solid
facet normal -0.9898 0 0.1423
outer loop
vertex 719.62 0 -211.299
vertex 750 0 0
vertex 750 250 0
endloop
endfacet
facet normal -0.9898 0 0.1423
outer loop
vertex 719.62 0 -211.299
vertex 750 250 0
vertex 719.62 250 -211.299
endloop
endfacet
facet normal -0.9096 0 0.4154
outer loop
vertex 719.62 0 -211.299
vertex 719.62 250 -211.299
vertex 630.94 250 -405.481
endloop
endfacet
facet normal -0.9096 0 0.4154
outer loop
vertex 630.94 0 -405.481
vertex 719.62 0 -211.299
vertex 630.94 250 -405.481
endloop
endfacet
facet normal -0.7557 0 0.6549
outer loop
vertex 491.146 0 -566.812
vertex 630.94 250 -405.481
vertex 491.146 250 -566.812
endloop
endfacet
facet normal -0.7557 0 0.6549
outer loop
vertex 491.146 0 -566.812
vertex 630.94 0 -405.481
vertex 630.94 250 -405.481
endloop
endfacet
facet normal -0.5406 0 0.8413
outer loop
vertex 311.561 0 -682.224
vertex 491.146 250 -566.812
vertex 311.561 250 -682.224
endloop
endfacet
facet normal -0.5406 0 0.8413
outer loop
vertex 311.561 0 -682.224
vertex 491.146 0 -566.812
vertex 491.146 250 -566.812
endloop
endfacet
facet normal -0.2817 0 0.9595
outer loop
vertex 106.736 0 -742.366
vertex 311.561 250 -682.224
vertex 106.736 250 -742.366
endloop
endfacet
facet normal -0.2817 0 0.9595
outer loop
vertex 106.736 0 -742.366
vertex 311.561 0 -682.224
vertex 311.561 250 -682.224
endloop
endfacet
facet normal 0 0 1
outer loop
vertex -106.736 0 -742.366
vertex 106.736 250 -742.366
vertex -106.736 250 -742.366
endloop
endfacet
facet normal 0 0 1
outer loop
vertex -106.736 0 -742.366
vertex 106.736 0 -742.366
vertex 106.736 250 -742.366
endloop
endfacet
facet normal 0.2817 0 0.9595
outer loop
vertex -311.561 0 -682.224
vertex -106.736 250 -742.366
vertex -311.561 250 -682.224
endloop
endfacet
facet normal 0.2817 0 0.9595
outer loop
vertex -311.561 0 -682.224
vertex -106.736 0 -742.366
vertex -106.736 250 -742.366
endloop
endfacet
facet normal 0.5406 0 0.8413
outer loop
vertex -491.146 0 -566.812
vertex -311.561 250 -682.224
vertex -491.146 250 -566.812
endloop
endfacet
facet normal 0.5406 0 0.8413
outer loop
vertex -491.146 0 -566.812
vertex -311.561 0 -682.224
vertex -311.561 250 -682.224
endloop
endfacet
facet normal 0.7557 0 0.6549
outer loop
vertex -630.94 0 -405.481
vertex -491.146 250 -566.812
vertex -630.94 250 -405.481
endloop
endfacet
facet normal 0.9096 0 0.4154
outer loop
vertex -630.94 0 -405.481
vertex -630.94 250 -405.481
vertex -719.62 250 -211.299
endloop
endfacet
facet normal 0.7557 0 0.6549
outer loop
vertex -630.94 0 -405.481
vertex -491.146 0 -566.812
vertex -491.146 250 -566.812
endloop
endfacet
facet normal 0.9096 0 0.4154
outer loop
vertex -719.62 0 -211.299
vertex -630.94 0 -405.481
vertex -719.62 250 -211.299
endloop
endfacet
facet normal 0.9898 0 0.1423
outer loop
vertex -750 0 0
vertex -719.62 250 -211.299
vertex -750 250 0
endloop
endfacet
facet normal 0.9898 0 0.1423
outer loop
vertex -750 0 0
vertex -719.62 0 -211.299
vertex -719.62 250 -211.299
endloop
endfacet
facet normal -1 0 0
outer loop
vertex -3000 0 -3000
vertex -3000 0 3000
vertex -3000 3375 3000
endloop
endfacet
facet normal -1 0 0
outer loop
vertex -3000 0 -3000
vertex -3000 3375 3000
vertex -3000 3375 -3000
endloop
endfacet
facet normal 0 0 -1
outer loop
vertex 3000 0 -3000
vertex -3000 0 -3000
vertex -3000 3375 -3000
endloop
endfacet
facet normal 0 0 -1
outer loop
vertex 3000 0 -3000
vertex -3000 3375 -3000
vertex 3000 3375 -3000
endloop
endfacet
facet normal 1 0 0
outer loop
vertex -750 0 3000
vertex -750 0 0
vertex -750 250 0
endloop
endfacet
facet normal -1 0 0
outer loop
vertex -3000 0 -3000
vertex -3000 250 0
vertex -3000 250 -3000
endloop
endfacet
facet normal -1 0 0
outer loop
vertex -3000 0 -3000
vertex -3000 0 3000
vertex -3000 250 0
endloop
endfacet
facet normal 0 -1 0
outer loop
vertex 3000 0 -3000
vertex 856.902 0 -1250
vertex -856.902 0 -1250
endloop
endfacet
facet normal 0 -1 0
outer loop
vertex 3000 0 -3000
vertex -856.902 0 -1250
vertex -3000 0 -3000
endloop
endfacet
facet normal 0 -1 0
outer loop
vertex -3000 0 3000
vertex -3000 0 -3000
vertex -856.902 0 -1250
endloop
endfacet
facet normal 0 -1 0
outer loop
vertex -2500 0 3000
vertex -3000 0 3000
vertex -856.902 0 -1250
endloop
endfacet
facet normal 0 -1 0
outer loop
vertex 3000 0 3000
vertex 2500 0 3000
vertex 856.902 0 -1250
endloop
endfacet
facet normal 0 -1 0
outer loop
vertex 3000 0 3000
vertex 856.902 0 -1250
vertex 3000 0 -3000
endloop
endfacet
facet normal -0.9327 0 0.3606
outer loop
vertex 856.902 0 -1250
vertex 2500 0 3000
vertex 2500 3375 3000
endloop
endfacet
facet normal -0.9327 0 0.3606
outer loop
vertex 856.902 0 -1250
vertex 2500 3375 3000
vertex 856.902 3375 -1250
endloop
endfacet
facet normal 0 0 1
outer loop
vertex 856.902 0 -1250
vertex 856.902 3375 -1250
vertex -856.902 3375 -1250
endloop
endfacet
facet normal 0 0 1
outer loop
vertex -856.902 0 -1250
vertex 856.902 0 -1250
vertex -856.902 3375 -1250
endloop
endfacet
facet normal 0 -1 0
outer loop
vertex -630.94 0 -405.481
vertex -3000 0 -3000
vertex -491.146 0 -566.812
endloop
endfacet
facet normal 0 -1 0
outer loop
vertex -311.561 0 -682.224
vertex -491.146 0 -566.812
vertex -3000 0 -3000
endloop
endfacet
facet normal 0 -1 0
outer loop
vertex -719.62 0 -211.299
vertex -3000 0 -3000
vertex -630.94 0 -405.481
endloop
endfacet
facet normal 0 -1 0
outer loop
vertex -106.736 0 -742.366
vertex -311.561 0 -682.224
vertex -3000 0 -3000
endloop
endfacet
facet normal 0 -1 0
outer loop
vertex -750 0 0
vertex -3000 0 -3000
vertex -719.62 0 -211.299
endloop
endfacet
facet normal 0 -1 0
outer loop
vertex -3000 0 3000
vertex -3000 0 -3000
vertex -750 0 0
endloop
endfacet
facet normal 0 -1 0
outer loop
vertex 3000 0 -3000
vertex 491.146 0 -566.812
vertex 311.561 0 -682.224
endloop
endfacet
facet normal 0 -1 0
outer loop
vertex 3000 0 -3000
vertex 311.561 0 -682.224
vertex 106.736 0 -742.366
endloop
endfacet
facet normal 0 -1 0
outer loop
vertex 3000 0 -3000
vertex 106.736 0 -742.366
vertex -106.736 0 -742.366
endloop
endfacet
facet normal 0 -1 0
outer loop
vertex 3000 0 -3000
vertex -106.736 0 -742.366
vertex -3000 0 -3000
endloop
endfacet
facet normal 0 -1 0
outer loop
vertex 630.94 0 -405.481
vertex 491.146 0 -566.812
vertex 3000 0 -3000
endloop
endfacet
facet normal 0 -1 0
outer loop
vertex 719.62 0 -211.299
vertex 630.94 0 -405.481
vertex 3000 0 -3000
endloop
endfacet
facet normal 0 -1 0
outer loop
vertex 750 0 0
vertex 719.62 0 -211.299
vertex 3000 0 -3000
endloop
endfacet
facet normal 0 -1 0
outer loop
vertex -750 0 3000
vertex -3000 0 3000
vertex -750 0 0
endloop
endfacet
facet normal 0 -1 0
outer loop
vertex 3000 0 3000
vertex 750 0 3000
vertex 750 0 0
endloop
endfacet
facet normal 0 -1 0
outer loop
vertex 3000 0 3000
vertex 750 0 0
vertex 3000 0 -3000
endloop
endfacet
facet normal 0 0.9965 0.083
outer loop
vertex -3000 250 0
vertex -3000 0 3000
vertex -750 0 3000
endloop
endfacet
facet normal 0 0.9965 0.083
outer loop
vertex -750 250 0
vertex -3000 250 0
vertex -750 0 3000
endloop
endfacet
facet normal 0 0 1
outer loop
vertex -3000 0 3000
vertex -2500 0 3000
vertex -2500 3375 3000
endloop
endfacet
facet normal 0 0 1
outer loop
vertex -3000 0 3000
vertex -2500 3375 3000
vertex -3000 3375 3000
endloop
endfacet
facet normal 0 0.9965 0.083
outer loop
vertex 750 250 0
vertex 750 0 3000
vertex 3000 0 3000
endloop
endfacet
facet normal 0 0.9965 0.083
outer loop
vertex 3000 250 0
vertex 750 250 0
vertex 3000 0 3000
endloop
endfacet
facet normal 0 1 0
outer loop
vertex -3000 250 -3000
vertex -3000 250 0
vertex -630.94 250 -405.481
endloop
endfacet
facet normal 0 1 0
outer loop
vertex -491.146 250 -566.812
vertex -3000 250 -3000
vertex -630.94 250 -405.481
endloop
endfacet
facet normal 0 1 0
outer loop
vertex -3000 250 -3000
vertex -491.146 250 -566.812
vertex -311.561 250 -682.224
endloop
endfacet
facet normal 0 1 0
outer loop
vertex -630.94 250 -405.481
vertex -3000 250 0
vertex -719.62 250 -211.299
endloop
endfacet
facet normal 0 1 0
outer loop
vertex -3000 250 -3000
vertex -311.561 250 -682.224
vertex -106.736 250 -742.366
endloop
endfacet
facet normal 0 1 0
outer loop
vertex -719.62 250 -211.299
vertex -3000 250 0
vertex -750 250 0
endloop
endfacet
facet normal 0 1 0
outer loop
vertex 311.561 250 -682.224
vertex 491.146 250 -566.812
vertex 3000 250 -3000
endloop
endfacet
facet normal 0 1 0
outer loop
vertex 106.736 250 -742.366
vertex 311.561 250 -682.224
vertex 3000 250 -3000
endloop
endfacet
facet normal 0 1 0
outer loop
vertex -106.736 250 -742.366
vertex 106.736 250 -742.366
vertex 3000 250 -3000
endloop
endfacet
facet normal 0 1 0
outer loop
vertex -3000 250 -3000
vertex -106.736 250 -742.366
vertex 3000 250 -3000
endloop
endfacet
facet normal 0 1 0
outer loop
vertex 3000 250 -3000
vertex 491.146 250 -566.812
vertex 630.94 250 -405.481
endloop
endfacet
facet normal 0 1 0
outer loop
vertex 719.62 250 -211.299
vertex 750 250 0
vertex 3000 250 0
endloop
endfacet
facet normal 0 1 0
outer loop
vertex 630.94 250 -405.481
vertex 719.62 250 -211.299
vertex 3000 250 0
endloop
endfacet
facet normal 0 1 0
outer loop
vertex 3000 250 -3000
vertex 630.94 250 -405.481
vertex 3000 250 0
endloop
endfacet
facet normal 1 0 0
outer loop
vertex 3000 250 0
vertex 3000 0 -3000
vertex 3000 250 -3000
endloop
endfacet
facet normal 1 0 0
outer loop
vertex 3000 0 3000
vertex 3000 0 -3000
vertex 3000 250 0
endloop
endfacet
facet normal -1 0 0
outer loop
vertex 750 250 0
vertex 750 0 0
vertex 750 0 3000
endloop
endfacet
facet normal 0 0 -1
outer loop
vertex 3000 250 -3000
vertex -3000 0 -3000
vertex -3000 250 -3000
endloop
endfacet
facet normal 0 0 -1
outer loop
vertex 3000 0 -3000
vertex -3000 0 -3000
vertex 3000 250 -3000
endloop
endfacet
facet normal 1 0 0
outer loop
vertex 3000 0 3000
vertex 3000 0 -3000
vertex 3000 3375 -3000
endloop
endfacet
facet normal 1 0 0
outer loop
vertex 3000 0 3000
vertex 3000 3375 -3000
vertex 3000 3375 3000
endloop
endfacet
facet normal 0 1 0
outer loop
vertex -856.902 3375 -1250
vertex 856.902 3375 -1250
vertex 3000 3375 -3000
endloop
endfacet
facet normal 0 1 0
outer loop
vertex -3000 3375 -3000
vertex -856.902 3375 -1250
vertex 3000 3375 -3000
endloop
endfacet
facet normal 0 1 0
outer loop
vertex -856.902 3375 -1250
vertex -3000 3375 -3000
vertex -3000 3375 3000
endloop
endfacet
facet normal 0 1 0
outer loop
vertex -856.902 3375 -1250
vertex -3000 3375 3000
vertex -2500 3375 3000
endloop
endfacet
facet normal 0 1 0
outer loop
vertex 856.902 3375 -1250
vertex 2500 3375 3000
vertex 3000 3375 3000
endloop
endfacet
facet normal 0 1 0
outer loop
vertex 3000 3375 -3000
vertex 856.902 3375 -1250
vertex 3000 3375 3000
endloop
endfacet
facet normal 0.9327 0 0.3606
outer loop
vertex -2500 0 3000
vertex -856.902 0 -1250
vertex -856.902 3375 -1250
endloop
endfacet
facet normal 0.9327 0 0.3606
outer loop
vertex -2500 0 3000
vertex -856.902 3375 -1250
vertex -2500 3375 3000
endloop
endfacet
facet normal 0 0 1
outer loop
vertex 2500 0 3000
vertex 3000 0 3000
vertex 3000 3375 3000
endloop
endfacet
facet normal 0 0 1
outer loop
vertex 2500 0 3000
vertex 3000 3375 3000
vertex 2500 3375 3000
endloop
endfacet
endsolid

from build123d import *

# Parameters (mm, degrees)
F1_DEPTH = 3375
F2_W     = 2250
F2_H     = 3000
F3_DEPTH = 250
F4_SIZE2 = 249.99999
F4_SIZE  = 2999.99999
F5_SIZE2 = 249.99999
F5_SIZE  = 2999.99999
F6_DEPTH = 250


# Not quite as in the source:
# - a fillet or chamfer is up to 0.001 mm smaller than in the source, because OpenCascade refuses the exact size


with BuildPart() as f1:
    # F0 (on Front) → F1 (new body)
    with BuildSketch(Plane.XZ):
        Polygon((3000, -3000), (3000, 3000), (2500, 3000), (856.9015333837, -1250), (-856.9015333837, -1250), (-2500, 3000), (-3000, 3000), (-3000, -3000), align=None)
    extrude(amount=-F1_DEPTH)


with BuildPart() as f3:
    # F2 (on Front) → F3 (new body)
    with BuildSketch(Plane.XZ):
        with Locations((1875, 1500)):
            Rectangle(F2_W, F2_H)
    extrude(amount=-F3_DEPTH)

    # F4 (size 3000 and 250 in the source; OpenCascade refuses exactly that, so slightly less here)
    f4_edges = [f3.edges().sort_by_distance(p)[0] for p in [
        (1875, 250, 3000),
    ]]
    f4_side = f3.faces().sort_by_distance((1875, 250, 1500))[0]
    chamfer(f4_edges, length=F4_SIZE, length2=F4_SIZE2, reference=f4_side)



with BuildPart() as f3b:
    # F2 (on Front) → F3, piece 2 (new body)
    with BuildSketch(Plane.XZ):
        with Locations((-1875, 1500)):
            Rectangle(F2_W, F2_H)
    extrude(amount=-F3_DEPTH)

    # F5 (size 3000 and 250 in the source; OpenCascade refuses exactly that, so slightly less here)
    f5_edges = [f3b.edges().sort_by_distance(p)[0] for p in [
        (-1875, 250, 3000),
    ]]
    f5_side = f3b.faces().sort_by_distance((-1875, 250, 1500))[0]
    chamfer(f5_edges, length=F5_SIZE, length2=F5_SIZE2, reference=f5_side)


with BuildPart() as f3_1:
    add(f3.part)

    add(f3b.part)  # F6 merges F3b
    # F2 (on Front) → F6 (join)
    with BuildSketch(Plane.XZ):
        with BuildLine():
            Line((-3000, 0), (-3000, -3000))
            Line((-3000, -3000), (3000, -3000))
            Line((3000, -3000), (3000, 0))
            Line((3000, 0), (750, 0))
            ThreePointArc((750, 0), (0, -750), (-750, 0))
            Line((-750, 0), (-3000, 0))
        make_face()
    extrude(amount=-F6_DEPTH)


solid = Compound([f1.part, f3_1.part])
